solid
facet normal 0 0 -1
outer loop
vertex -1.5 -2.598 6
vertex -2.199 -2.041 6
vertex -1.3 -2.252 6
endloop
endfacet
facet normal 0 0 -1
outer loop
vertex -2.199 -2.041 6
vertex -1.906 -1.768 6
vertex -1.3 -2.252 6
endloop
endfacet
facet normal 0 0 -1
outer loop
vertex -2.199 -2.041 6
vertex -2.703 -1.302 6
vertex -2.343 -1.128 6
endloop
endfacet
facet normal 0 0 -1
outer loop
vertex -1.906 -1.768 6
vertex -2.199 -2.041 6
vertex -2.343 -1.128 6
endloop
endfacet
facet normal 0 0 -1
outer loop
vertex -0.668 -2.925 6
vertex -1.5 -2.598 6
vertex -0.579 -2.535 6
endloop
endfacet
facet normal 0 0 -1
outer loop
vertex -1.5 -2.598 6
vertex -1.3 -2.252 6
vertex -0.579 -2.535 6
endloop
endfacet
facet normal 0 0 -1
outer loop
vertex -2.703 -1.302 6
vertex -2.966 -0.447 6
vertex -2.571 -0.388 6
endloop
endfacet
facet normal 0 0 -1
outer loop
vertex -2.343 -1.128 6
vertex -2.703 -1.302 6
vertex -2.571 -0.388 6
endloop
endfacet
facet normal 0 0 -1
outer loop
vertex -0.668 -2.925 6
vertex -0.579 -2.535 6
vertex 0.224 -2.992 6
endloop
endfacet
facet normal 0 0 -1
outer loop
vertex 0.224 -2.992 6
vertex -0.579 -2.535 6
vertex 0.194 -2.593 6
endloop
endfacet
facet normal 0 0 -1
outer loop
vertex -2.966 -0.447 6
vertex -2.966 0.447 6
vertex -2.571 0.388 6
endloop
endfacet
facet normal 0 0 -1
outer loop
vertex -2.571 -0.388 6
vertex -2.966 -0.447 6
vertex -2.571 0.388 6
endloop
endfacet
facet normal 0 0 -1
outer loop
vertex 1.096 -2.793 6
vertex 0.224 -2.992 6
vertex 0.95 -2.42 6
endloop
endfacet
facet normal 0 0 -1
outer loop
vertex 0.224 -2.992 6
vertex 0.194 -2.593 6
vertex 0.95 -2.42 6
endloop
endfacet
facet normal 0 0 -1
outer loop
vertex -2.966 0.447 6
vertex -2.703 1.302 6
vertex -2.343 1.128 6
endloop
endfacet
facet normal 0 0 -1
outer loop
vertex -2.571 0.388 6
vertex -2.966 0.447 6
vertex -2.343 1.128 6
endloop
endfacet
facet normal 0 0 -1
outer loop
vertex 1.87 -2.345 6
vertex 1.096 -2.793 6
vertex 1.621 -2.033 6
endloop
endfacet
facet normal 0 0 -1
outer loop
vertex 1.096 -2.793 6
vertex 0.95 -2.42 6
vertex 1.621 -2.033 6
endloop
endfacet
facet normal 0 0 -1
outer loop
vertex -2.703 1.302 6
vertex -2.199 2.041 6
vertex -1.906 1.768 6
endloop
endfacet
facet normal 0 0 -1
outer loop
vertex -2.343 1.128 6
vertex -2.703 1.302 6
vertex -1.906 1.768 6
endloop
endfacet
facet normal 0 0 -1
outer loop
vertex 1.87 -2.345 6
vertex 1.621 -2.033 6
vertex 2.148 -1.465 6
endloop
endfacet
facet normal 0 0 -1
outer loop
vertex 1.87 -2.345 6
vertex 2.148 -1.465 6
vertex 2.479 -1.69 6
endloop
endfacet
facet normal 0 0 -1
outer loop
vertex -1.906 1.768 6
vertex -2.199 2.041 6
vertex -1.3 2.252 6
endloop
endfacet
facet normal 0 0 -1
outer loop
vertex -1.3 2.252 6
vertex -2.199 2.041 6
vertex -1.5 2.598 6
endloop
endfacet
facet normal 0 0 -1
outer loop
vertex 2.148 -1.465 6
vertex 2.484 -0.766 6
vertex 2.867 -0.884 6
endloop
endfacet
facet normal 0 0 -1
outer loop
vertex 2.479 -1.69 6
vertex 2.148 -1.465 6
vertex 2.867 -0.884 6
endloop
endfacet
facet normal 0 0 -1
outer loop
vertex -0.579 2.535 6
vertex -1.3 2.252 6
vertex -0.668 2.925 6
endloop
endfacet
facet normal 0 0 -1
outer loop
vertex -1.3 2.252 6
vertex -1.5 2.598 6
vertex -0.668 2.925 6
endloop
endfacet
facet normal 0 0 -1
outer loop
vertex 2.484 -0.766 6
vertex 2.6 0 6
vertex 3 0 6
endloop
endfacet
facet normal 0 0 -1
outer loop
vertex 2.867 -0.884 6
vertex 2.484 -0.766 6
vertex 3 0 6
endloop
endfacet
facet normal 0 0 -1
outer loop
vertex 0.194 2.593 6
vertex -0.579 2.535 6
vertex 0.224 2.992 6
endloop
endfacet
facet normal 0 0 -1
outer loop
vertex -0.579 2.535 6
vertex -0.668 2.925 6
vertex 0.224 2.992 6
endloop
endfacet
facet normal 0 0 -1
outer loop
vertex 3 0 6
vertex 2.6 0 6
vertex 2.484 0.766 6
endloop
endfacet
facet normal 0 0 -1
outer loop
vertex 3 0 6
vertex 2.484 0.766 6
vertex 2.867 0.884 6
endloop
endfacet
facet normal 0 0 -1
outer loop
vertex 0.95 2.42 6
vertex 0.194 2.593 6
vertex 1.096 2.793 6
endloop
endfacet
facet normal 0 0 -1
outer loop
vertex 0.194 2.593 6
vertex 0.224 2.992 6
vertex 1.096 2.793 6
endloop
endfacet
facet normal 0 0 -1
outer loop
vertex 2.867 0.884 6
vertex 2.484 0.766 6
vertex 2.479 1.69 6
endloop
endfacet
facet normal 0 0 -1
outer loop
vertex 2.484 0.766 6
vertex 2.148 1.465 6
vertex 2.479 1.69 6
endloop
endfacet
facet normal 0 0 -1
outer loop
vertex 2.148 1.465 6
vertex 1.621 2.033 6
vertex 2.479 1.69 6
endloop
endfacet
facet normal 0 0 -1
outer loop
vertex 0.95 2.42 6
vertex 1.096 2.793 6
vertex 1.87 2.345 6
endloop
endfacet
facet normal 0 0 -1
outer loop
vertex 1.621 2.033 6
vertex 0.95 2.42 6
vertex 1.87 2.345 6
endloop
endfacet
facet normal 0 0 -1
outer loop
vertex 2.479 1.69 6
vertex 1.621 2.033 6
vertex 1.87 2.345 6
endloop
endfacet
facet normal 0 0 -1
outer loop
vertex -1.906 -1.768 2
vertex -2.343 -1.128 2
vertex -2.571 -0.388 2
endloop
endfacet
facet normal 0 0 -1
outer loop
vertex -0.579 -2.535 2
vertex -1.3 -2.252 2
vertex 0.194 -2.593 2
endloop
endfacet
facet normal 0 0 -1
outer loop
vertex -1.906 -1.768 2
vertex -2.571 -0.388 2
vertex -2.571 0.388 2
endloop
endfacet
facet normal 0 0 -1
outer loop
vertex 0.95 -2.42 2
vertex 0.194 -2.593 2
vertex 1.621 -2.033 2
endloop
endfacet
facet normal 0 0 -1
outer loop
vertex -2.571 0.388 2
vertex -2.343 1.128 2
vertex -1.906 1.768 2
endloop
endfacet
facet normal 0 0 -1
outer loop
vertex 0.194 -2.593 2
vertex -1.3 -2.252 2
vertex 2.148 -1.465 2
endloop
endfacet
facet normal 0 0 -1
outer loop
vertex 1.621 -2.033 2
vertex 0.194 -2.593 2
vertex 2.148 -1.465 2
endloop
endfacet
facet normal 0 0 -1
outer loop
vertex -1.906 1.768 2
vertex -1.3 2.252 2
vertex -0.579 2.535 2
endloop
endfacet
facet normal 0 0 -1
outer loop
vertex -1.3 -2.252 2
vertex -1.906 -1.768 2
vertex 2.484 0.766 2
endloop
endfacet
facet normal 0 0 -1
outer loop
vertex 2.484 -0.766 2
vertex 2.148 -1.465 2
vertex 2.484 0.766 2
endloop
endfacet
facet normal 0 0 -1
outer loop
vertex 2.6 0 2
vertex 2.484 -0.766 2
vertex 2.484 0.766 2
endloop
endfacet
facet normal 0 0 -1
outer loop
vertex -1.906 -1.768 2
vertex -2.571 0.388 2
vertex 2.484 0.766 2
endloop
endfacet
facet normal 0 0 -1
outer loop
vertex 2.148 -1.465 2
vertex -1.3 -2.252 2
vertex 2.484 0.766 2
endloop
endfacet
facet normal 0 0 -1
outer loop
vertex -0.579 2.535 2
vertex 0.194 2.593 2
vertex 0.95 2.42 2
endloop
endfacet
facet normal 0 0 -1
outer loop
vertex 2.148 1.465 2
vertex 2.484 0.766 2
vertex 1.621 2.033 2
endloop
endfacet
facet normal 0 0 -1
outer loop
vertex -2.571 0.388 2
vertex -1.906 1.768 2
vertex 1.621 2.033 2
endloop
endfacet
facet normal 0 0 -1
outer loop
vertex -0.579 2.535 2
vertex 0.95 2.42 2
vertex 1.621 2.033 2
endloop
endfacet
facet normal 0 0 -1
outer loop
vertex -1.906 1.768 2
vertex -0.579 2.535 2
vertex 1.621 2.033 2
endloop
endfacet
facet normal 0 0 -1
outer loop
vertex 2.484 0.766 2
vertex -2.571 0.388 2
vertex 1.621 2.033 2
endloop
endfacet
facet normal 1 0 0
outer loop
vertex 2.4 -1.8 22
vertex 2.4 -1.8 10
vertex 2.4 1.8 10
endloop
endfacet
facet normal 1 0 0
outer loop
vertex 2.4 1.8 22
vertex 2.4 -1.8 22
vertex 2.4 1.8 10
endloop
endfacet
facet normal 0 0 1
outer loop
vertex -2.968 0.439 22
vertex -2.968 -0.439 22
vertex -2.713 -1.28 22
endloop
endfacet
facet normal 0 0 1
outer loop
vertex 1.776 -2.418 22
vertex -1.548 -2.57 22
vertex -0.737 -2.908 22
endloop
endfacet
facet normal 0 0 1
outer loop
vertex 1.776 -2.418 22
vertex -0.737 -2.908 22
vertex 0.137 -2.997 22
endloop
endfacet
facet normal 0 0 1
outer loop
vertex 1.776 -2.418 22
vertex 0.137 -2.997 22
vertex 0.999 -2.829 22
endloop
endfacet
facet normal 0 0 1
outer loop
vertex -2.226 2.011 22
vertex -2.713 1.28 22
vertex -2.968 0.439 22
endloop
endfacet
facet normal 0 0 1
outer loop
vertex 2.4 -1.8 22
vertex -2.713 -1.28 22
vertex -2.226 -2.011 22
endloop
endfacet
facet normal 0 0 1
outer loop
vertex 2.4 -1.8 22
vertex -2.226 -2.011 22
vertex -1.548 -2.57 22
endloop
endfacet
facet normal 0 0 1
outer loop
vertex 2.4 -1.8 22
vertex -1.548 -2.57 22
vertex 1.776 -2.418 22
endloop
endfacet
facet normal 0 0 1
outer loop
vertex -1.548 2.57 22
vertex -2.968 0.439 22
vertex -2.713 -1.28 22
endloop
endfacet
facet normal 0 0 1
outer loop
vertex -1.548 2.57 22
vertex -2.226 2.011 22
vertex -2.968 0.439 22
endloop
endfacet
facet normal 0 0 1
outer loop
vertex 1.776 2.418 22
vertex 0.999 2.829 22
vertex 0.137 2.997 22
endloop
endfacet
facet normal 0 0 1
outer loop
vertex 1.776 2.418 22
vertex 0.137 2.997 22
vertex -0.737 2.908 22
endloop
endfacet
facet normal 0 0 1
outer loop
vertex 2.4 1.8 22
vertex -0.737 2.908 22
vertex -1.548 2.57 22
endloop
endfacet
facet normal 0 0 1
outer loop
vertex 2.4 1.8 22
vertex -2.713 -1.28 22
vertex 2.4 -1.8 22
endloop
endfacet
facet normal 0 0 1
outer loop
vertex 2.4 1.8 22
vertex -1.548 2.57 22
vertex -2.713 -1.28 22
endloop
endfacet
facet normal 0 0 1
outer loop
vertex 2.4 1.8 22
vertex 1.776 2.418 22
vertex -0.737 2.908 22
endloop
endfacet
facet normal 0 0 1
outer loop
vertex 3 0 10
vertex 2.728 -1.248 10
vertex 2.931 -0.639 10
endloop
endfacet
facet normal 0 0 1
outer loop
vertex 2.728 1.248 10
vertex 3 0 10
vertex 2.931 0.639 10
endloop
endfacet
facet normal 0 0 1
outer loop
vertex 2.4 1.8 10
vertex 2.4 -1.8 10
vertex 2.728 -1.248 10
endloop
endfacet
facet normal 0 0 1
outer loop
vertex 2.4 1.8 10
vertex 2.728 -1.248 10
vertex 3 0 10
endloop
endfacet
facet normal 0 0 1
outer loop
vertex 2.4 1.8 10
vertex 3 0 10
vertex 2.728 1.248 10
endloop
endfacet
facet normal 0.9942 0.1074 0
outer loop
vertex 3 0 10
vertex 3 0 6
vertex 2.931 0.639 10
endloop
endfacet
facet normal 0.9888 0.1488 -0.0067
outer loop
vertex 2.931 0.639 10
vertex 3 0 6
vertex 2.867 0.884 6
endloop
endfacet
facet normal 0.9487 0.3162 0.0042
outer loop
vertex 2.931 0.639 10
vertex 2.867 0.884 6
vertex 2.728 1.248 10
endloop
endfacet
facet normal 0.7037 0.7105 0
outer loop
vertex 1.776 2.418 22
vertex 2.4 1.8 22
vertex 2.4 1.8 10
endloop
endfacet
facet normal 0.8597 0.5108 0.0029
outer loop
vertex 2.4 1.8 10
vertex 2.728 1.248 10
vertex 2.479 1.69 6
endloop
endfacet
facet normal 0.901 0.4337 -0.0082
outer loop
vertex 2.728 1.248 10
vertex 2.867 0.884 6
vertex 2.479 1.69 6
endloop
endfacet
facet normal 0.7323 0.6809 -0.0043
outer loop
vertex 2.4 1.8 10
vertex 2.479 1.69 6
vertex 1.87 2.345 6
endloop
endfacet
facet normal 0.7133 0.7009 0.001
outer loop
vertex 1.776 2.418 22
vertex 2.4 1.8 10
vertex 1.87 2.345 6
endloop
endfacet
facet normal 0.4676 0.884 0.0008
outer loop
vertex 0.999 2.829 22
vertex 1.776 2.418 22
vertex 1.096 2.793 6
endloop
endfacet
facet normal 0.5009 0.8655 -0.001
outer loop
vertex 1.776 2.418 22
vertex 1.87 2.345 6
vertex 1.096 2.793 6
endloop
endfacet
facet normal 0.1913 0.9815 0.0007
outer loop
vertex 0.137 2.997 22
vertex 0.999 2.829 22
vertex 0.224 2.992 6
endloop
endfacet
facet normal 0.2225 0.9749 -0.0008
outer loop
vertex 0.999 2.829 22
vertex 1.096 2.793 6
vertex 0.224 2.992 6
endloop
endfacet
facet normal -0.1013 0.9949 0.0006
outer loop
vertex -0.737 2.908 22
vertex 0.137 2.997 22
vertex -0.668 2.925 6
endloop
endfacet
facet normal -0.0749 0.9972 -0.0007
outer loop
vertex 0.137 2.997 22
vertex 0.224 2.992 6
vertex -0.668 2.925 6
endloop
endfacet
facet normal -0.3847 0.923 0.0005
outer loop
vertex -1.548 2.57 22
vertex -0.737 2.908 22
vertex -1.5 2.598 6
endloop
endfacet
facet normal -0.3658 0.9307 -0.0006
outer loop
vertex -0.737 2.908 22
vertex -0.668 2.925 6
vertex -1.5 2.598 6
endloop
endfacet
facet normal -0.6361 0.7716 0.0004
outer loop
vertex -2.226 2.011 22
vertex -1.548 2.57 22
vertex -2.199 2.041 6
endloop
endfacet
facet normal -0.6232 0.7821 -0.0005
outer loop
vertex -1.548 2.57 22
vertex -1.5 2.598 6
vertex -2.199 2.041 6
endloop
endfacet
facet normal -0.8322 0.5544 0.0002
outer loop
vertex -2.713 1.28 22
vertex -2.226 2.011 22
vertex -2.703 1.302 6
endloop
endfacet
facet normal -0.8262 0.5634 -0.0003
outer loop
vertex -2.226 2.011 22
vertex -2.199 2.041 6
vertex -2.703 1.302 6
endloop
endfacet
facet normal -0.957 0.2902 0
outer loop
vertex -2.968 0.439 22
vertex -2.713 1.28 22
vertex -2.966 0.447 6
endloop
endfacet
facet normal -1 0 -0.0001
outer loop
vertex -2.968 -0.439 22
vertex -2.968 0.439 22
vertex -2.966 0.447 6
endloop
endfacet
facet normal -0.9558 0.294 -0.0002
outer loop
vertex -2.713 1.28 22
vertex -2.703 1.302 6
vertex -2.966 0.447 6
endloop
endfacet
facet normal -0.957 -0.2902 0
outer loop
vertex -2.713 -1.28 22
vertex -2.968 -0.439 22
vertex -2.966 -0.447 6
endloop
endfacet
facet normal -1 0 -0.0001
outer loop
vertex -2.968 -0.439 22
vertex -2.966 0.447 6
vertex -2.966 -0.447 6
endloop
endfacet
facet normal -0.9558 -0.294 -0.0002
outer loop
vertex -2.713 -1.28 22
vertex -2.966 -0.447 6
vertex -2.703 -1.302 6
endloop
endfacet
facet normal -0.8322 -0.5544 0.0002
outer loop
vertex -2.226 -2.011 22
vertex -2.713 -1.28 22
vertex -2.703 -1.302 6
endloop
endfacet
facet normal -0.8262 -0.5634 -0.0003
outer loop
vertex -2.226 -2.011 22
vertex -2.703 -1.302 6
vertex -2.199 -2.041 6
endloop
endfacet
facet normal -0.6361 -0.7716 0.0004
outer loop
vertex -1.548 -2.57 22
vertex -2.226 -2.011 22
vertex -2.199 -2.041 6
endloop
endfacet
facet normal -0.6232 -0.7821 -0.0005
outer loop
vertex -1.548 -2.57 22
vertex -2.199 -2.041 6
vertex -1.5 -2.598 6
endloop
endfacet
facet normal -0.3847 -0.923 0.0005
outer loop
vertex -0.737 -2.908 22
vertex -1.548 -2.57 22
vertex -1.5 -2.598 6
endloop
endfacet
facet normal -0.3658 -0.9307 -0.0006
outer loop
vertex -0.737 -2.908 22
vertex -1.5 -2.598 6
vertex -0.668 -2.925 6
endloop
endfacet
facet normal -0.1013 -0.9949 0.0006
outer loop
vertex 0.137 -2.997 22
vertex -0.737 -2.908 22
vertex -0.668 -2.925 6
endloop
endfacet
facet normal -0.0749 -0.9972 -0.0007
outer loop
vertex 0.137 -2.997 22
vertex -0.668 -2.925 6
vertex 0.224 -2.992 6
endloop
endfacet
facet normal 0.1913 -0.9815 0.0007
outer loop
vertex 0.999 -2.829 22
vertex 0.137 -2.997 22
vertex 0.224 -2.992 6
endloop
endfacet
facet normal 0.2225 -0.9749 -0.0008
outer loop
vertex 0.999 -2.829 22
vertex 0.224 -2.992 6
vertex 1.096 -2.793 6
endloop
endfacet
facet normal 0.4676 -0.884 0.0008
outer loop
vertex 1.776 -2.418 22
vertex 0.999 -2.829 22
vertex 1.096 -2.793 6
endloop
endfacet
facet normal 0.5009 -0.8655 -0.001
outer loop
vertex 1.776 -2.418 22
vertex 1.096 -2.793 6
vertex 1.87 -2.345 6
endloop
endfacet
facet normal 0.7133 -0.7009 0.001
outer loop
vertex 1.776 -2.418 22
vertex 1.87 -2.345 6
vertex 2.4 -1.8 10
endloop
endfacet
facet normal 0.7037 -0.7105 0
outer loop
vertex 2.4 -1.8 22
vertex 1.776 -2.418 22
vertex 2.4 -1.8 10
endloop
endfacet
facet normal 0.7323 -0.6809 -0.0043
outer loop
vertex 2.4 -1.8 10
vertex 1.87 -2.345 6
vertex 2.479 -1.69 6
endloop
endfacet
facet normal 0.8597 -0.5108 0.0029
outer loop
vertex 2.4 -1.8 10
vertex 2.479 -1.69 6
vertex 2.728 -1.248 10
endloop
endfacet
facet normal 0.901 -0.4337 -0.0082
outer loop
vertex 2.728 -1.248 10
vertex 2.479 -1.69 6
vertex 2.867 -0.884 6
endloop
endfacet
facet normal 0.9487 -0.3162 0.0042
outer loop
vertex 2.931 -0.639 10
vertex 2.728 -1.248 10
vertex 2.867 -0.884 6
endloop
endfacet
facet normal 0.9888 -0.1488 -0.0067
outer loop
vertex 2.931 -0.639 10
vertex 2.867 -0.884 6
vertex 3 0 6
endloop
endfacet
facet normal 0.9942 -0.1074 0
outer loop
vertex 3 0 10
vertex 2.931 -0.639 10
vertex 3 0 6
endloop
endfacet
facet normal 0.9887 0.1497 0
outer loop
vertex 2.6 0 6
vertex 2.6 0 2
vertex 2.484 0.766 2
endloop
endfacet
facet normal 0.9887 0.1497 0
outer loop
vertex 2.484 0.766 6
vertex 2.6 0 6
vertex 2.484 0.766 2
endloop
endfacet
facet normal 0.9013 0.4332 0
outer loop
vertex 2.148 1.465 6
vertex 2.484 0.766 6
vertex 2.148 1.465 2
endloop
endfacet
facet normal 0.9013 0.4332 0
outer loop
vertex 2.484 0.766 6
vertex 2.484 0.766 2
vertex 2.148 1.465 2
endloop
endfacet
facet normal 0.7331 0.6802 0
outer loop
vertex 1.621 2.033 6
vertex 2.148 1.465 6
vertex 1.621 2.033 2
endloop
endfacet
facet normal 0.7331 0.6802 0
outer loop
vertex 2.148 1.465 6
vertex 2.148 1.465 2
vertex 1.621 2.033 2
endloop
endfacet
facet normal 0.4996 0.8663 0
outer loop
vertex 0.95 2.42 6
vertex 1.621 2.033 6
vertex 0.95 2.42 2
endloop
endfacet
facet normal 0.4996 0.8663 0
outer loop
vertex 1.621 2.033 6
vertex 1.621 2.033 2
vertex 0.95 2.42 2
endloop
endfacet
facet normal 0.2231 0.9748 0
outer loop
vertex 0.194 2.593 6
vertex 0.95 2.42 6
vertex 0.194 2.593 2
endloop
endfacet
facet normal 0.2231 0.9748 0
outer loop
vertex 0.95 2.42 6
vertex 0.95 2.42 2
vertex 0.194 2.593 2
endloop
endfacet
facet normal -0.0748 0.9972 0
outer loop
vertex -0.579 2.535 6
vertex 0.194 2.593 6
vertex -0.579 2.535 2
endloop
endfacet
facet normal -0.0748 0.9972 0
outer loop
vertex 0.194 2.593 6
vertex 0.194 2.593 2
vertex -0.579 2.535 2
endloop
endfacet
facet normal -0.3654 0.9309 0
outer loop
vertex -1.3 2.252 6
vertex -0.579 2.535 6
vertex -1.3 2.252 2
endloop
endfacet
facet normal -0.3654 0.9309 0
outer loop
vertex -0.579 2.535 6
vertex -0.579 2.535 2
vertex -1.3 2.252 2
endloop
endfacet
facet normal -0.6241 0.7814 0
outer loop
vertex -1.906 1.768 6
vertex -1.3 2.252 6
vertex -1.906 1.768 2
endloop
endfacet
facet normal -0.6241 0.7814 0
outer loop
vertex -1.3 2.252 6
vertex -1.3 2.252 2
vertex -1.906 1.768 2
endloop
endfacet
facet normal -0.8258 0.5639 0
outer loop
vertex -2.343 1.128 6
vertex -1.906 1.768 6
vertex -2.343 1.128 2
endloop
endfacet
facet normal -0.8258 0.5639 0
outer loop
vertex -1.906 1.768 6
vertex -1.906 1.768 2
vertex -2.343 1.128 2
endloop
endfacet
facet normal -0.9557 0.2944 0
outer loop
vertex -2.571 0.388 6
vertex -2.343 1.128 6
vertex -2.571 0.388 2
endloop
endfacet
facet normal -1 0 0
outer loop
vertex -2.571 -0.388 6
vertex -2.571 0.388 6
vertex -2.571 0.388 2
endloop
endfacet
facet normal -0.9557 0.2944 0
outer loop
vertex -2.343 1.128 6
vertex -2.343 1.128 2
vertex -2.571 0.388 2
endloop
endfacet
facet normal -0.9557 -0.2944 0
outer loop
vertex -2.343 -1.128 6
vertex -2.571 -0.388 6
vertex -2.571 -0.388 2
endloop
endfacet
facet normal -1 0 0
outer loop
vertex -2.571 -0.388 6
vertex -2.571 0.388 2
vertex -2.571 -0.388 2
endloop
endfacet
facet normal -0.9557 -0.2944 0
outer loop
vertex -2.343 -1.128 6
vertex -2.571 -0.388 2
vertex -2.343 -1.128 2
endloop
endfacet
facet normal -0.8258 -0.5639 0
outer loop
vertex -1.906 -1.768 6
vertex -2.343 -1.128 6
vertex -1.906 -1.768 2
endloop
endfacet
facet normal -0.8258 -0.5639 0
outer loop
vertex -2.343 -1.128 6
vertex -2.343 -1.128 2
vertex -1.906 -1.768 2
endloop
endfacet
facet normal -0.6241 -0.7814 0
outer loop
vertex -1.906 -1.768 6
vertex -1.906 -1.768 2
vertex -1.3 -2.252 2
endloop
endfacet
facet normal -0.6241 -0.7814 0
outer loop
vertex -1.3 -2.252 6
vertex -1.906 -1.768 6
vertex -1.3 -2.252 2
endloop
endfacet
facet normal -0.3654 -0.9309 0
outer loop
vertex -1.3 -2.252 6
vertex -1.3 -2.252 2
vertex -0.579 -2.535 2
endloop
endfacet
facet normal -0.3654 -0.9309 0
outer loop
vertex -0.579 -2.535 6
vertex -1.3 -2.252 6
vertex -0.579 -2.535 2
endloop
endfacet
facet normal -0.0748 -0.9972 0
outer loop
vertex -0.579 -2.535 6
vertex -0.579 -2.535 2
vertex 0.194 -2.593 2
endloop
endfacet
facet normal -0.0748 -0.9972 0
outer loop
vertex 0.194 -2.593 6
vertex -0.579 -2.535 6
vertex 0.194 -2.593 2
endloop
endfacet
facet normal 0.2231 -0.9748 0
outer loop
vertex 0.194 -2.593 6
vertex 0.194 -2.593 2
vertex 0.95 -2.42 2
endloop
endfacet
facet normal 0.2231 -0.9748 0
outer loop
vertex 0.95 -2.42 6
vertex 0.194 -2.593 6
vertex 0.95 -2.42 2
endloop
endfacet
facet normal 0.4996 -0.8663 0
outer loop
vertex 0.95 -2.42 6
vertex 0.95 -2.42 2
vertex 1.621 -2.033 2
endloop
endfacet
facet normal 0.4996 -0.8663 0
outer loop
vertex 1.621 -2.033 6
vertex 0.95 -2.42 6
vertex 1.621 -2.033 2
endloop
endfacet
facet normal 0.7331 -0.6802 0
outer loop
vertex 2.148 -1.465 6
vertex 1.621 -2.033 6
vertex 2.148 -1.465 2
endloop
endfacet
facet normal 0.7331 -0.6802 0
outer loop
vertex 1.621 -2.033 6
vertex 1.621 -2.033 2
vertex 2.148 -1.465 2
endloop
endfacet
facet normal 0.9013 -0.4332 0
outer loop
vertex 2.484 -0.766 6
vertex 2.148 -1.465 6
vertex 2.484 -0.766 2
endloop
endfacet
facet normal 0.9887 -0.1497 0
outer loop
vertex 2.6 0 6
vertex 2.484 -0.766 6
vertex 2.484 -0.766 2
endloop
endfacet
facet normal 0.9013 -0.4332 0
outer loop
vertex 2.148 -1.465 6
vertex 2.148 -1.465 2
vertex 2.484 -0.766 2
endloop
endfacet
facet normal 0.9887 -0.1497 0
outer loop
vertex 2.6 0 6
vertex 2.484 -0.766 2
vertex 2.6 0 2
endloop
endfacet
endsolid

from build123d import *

# Parameters (mm, degrees)
F_01_START                              = 6
S01_OUTPUT_SHAFT_R                      = 3
F_01_OUTPUT_SHAFT_DEPTH                 = 16
F_02_START                              = 10
S02_D_FLAT_ON_EXPOSED_TIP_W             = 1.6
S02_D_FLAT_ON_EXPOSED_TIP_H             = 8
F_02_D_FLAT_ON_EXPOSED_TIP_DEPTH        = 12.2
F_03_START                              = 2
S03_OUTPUT_PILOT_IN_GEARBOX_NOSE_R      = 2.6
F_03_OUTPUT_PILOT_IN_GEARBOX_NOSE_DEPTH = 4


with BuildPart() as part:
    # S01 - Output shaft → 01 - Output shaft (new body)
    with BuildSketch(Plane.XY.offset(F_01_START)):
        Circle(S01_OUTPUT_SHAFT_R)
    extrude(amount=F_01_OUTPUT_SHAFT_DEPTH)

    # S02 - D flat on exposed tip → 02 - D flat on exposed tip (cut)
    with BuildSketch(Plane.XY.offset(F_02_START)):
        with Locations((3.2, 0)):
            Rectangle(S02_D_FLAT_ON_EXPOSED_TIP_W, S02_D_FLAT_ON_EXPOSED_TIP_H)
    extrude(amount=F_02_D_FLAT_ON_EXPOSED_TIP_DEPTH, mode=Mode.SUBTRACT)

    # S03 - Output pilot in gearbox nose → 03 - Output pilot in gearbox nose (add)
    with BuildSketch(Plane.XY.offset(F_03_START)):
        Circle(S03_OUTPUT_PILOT_IN_GEARBOX_NOSE_R)
    extrude(amount=F_03_OUTPUT_PILOT_IN_GEARBOX_NOSE_DEPTH)


solid = part.part
